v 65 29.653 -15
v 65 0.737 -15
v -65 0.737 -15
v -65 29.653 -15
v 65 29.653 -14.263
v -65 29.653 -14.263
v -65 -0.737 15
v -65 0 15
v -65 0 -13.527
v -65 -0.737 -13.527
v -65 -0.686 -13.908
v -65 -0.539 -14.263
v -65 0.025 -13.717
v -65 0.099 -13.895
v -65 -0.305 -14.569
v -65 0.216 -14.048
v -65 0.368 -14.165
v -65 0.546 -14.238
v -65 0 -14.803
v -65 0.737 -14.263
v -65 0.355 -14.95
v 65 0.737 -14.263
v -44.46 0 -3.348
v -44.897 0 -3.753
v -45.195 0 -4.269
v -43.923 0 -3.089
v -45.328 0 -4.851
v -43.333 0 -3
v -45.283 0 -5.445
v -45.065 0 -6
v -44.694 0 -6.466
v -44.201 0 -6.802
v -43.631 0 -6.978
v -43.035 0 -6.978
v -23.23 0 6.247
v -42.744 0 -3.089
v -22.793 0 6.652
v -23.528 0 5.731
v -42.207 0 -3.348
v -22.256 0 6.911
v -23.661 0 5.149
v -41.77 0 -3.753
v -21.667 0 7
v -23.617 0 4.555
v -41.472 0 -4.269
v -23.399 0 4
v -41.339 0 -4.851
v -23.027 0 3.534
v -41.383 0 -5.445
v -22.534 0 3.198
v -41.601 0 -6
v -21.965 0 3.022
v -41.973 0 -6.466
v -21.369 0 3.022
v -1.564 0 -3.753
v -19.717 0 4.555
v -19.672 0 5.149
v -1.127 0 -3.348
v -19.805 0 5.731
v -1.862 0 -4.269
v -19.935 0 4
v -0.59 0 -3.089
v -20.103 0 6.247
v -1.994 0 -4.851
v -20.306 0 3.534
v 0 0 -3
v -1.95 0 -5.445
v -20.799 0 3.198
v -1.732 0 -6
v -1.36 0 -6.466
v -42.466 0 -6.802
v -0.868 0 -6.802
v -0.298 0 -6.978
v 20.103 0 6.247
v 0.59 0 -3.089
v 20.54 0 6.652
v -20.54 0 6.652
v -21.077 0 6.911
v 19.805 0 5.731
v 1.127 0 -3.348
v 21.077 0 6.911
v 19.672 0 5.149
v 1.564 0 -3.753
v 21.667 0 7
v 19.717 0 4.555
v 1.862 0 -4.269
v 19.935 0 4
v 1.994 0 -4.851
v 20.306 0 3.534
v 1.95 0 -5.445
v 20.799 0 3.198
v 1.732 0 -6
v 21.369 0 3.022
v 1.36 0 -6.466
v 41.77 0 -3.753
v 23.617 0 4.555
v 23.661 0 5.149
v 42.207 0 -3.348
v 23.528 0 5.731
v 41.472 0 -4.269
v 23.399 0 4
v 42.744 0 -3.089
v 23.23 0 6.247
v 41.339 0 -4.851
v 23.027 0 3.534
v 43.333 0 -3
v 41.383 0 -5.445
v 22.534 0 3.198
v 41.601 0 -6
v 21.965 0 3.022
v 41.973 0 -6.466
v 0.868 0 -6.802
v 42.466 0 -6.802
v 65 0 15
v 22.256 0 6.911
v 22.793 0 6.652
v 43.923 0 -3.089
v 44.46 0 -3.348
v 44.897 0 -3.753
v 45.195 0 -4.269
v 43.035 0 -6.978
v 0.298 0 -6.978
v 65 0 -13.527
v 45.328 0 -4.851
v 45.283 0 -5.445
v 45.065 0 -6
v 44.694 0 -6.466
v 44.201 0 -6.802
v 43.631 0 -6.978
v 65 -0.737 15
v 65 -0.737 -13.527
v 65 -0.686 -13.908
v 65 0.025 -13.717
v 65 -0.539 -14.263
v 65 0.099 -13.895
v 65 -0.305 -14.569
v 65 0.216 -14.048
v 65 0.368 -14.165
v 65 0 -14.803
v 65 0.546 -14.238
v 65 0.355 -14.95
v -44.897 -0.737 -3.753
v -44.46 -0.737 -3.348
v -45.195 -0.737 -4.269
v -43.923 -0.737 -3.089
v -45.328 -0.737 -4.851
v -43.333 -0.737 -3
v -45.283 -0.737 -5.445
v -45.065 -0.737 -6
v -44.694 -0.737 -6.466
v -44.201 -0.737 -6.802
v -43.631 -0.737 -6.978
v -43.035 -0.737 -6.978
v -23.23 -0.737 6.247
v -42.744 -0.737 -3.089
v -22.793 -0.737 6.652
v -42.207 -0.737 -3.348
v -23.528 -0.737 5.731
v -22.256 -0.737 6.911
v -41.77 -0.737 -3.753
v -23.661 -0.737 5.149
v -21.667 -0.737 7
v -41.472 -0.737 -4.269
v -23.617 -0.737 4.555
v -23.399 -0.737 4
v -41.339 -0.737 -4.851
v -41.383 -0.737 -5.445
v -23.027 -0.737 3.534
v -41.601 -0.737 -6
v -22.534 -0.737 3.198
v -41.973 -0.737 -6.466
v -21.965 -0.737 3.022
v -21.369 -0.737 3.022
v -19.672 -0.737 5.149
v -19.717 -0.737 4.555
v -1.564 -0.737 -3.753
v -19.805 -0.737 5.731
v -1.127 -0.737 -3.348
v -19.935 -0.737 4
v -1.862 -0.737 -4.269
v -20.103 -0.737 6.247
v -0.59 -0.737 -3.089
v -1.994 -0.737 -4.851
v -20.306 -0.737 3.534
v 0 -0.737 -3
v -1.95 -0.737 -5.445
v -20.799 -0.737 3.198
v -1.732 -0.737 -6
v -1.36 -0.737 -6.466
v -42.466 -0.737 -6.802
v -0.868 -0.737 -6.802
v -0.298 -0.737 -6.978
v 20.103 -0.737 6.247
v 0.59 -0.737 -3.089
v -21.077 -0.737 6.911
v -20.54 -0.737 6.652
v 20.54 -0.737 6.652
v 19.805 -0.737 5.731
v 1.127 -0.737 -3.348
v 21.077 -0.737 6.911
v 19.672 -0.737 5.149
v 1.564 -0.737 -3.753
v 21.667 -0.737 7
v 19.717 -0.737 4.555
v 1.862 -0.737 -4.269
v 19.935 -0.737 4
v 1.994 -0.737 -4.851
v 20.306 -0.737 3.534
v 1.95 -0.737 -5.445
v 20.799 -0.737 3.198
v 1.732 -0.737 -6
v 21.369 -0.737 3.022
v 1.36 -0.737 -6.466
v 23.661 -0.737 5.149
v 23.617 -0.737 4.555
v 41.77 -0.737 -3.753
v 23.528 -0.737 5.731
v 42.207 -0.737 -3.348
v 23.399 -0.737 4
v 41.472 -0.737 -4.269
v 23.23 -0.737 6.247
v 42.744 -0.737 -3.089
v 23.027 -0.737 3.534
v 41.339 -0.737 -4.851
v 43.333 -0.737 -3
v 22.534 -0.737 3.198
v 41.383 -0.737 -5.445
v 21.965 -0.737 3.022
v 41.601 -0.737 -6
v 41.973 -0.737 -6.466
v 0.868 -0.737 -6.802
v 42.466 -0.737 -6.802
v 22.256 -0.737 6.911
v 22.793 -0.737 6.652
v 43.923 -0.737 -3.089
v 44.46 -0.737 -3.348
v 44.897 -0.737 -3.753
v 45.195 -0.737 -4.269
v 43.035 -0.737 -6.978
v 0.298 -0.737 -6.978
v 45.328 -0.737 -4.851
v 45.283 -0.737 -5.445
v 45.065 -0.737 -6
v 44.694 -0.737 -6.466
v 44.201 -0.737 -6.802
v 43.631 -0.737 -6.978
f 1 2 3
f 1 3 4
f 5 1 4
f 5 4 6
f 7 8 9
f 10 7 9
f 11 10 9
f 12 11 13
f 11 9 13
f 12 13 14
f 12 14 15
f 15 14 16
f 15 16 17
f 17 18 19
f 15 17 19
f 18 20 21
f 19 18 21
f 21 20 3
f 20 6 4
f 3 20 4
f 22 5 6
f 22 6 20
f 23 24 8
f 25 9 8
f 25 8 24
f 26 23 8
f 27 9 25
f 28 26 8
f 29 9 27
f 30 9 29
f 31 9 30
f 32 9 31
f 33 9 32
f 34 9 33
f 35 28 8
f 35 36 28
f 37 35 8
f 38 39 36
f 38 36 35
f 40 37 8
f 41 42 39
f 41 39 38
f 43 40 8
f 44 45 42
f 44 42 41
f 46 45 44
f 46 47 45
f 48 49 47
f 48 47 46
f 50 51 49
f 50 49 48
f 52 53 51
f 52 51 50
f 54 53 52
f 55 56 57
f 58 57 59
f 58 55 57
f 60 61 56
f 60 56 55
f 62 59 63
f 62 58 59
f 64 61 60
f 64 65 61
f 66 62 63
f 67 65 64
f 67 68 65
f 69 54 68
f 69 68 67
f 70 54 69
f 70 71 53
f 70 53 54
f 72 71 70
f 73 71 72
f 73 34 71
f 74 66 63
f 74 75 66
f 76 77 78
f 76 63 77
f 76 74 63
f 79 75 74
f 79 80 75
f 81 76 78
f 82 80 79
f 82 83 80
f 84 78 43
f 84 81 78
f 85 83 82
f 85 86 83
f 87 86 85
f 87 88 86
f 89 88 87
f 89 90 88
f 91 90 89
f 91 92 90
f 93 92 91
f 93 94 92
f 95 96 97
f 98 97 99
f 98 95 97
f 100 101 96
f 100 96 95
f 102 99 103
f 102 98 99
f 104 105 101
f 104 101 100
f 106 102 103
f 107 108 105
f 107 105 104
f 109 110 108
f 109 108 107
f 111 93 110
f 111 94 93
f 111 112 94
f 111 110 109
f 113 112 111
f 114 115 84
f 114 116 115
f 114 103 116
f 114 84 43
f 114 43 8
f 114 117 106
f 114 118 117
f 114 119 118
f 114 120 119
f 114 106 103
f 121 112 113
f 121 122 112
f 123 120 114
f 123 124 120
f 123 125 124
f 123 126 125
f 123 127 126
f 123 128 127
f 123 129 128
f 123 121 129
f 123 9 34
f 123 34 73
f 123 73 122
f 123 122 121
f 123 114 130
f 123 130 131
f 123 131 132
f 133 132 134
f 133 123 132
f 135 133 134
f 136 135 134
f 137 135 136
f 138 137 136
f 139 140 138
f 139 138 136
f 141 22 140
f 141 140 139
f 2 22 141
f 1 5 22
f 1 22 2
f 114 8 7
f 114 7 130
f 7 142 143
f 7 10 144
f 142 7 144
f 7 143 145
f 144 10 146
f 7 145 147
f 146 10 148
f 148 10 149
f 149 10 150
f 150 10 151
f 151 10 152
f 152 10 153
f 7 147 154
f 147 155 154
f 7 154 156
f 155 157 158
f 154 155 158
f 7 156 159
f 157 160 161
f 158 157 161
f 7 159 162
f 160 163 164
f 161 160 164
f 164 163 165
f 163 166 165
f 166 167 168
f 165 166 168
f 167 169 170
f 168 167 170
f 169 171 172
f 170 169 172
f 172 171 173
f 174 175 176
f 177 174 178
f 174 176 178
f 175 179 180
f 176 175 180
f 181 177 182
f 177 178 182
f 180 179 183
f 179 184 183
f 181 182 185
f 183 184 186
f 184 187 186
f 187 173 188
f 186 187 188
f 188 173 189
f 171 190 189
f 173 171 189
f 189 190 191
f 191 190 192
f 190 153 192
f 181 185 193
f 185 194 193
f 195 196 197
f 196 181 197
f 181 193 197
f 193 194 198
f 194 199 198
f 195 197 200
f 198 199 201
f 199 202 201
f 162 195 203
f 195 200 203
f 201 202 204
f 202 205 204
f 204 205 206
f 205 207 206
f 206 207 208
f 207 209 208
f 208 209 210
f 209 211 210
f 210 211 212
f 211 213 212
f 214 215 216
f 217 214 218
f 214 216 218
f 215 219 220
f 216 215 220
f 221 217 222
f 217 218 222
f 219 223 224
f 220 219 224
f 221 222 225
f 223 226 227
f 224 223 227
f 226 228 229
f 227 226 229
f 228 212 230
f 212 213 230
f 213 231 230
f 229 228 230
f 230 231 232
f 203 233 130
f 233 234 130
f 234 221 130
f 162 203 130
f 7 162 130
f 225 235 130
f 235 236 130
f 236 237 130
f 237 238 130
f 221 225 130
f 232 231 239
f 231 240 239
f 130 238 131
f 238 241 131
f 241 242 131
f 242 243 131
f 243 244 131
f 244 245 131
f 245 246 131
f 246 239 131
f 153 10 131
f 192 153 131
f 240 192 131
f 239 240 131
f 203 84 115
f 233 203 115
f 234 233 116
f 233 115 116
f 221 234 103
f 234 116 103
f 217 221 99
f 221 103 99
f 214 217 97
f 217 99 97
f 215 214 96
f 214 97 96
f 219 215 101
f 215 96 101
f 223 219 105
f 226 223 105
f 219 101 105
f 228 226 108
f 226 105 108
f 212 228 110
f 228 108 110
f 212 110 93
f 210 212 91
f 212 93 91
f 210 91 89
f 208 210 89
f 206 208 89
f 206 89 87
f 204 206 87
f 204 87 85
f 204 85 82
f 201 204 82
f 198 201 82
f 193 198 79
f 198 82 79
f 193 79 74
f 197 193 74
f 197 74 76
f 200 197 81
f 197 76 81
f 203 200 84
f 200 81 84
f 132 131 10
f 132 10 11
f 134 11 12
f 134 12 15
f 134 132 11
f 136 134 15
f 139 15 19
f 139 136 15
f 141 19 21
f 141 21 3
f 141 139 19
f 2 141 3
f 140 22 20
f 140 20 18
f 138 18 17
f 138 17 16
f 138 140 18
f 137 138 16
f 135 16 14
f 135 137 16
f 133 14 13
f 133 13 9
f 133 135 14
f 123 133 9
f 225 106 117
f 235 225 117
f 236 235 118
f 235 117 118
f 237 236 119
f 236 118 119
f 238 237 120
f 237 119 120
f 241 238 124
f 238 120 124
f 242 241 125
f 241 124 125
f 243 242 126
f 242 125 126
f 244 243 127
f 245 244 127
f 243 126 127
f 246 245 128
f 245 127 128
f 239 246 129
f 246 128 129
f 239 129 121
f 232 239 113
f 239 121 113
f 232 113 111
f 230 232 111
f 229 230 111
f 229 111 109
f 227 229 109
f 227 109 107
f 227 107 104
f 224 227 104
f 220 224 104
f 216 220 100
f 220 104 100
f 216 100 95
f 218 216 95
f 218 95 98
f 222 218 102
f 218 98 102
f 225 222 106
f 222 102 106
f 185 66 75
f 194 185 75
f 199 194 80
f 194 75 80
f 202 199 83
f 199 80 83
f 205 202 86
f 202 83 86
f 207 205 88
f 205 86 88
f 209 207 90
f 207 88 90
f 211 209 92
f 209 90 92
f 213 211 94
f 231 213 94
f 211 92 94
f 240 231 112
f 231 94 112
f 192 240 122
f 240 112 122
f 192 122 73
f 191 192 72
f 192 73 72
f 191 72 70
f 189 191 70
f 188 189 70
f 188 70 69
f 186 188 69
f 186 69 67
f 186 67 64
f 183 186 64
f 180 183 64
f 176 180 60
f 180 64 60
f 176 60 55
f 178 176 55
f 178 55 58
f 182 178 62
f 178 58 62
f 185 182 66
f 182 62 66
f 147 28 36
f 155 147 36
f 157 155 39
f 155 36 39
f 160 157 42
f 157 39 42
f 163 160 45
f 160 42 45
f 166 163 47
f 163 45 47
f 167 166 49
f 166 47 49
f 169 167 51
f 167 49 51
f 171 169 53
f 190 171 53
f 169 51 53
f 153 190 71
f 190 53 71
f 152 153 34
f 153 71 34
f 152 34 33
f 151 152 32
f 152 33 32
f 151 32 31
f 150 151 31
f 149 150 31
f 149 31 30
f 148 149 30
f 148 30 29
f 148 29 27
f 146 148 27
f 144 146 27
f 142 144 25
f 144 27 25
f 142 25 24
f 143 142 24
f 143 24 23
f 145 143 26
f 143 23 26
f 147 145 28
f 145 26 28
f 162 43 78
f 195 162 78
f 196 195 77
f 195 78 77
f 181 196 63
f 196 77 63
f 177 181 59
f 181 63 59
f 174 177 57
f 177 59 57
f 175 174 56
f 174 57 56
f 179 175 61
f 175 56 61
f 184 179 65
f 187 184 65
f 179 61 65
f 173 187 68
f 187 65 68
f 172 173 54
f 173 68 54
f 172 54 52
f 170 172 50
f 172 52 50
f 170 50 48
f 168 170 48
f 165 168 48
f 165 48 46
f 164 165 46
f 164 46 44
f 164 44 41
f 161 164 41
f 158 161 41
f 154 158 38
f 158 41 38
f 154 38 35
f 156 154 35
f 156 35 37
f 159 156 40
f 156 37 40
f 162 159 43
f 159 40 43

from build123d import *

# Parameters (mm, degrees)
SKETCH1_W                    = 130
SKETCH1_H                    = 30
SKETCH1_R                    = 2
BASE_FLANGE1_DEPTH           = 0.7366
EDGE_FLANGE1_STRIP_W         = 4.4196
EDGE_FLANGE1_STRIP_H         = 0.7366
EDGE_FLANGE1_STRIP_CUT_DEPTH = 130
EDGE_FLANGE1_DEPTH           = 130


# Sheet-metal steps are written as plain solids
with BuildPart() as part:
    # Sketch1 → Base-Flange1 (new body)
    with BuildSketch(Plane(origin=(0, 0, 0), x_dir=(1, 0, 0), z_dir=(0, 1, 0))):
        Rectangle(SKETCH1_W, SKETCH1_H)
        with Locations(Location((0, 5, 0), (0, 0, 270))):
            Circle(SKETCH1_R, mode=Mode.SUBTRACT)
        with Locations(Location((-21.666666667, -5, 0), (0, 0, 270))):
            Circle(SKETCH1_R, mode=Mode.SUBTRACT)
        with Locations(Location((-43.333333333, 5, 0), (0, 0, 270))):
            Circle(SKETCH1_R, mode=Mode.SUBTRACT)
        with Locations(Location((21.666666667, -5, 0), (0, 0, 270))):
            Circle(SKETCH1_R, mode=Mode.SUBTRACT)
        with Locations(Location((43.333333333, 5, 0), (0, 0, 270))):
            Circle(SKETCH1_R, mode=Mode.SUBTRACT)
    extrude(amount=-BASE_FLANGE1_DEPTH)

    # Edge-Flange1 strip (across the edge) → Edge-Flange1 strip cut (cut)
    with BuildSketch(Plane(origin=(65, 0, -15), x_dir=(0, 0, 1), z_dir=(-1, 0, 0))):
        with Locations((-0.7366, -0.3683)):
            Rectangle(EDGE_FLANGE1_STRIP_W, EDGE_FLANGE1_STRIP_H)
    extrude(amount=EDGE_FLANGE1_STRIP_CUT_DEPTH, mode=Mode.SUBTRACT)

    # Edge-Flange1 section (across the edge) → Edge-Flange1 (add)
    with BuildSketch(Plane(origin=(65, 0, -15), x_dir=(0, 0, 1), z_dir=(-1, 0, 0))):
        with BuildLine():
            Line((0, 0.7366), (0, 29.6534))
            Line((0, 29.6534), (0.7366, 29.6534))
            Line((0.7366, 29.6534), (0.7366, 0.7366))
            ThreePointArc((0.7366, 0.7366), (0.952345145, 0.215745145), (1.4732, 0))
            Line((1.4732, 0), (1.4732, -0.7366))
            ThreePointArc((1.4732, -0.7366), (0.43149029, -0.30510971), (0, 0.7366))
        make_face()
    extrude(amount=EDGE_FLANGE1_DEPTH)


solid = part.part
